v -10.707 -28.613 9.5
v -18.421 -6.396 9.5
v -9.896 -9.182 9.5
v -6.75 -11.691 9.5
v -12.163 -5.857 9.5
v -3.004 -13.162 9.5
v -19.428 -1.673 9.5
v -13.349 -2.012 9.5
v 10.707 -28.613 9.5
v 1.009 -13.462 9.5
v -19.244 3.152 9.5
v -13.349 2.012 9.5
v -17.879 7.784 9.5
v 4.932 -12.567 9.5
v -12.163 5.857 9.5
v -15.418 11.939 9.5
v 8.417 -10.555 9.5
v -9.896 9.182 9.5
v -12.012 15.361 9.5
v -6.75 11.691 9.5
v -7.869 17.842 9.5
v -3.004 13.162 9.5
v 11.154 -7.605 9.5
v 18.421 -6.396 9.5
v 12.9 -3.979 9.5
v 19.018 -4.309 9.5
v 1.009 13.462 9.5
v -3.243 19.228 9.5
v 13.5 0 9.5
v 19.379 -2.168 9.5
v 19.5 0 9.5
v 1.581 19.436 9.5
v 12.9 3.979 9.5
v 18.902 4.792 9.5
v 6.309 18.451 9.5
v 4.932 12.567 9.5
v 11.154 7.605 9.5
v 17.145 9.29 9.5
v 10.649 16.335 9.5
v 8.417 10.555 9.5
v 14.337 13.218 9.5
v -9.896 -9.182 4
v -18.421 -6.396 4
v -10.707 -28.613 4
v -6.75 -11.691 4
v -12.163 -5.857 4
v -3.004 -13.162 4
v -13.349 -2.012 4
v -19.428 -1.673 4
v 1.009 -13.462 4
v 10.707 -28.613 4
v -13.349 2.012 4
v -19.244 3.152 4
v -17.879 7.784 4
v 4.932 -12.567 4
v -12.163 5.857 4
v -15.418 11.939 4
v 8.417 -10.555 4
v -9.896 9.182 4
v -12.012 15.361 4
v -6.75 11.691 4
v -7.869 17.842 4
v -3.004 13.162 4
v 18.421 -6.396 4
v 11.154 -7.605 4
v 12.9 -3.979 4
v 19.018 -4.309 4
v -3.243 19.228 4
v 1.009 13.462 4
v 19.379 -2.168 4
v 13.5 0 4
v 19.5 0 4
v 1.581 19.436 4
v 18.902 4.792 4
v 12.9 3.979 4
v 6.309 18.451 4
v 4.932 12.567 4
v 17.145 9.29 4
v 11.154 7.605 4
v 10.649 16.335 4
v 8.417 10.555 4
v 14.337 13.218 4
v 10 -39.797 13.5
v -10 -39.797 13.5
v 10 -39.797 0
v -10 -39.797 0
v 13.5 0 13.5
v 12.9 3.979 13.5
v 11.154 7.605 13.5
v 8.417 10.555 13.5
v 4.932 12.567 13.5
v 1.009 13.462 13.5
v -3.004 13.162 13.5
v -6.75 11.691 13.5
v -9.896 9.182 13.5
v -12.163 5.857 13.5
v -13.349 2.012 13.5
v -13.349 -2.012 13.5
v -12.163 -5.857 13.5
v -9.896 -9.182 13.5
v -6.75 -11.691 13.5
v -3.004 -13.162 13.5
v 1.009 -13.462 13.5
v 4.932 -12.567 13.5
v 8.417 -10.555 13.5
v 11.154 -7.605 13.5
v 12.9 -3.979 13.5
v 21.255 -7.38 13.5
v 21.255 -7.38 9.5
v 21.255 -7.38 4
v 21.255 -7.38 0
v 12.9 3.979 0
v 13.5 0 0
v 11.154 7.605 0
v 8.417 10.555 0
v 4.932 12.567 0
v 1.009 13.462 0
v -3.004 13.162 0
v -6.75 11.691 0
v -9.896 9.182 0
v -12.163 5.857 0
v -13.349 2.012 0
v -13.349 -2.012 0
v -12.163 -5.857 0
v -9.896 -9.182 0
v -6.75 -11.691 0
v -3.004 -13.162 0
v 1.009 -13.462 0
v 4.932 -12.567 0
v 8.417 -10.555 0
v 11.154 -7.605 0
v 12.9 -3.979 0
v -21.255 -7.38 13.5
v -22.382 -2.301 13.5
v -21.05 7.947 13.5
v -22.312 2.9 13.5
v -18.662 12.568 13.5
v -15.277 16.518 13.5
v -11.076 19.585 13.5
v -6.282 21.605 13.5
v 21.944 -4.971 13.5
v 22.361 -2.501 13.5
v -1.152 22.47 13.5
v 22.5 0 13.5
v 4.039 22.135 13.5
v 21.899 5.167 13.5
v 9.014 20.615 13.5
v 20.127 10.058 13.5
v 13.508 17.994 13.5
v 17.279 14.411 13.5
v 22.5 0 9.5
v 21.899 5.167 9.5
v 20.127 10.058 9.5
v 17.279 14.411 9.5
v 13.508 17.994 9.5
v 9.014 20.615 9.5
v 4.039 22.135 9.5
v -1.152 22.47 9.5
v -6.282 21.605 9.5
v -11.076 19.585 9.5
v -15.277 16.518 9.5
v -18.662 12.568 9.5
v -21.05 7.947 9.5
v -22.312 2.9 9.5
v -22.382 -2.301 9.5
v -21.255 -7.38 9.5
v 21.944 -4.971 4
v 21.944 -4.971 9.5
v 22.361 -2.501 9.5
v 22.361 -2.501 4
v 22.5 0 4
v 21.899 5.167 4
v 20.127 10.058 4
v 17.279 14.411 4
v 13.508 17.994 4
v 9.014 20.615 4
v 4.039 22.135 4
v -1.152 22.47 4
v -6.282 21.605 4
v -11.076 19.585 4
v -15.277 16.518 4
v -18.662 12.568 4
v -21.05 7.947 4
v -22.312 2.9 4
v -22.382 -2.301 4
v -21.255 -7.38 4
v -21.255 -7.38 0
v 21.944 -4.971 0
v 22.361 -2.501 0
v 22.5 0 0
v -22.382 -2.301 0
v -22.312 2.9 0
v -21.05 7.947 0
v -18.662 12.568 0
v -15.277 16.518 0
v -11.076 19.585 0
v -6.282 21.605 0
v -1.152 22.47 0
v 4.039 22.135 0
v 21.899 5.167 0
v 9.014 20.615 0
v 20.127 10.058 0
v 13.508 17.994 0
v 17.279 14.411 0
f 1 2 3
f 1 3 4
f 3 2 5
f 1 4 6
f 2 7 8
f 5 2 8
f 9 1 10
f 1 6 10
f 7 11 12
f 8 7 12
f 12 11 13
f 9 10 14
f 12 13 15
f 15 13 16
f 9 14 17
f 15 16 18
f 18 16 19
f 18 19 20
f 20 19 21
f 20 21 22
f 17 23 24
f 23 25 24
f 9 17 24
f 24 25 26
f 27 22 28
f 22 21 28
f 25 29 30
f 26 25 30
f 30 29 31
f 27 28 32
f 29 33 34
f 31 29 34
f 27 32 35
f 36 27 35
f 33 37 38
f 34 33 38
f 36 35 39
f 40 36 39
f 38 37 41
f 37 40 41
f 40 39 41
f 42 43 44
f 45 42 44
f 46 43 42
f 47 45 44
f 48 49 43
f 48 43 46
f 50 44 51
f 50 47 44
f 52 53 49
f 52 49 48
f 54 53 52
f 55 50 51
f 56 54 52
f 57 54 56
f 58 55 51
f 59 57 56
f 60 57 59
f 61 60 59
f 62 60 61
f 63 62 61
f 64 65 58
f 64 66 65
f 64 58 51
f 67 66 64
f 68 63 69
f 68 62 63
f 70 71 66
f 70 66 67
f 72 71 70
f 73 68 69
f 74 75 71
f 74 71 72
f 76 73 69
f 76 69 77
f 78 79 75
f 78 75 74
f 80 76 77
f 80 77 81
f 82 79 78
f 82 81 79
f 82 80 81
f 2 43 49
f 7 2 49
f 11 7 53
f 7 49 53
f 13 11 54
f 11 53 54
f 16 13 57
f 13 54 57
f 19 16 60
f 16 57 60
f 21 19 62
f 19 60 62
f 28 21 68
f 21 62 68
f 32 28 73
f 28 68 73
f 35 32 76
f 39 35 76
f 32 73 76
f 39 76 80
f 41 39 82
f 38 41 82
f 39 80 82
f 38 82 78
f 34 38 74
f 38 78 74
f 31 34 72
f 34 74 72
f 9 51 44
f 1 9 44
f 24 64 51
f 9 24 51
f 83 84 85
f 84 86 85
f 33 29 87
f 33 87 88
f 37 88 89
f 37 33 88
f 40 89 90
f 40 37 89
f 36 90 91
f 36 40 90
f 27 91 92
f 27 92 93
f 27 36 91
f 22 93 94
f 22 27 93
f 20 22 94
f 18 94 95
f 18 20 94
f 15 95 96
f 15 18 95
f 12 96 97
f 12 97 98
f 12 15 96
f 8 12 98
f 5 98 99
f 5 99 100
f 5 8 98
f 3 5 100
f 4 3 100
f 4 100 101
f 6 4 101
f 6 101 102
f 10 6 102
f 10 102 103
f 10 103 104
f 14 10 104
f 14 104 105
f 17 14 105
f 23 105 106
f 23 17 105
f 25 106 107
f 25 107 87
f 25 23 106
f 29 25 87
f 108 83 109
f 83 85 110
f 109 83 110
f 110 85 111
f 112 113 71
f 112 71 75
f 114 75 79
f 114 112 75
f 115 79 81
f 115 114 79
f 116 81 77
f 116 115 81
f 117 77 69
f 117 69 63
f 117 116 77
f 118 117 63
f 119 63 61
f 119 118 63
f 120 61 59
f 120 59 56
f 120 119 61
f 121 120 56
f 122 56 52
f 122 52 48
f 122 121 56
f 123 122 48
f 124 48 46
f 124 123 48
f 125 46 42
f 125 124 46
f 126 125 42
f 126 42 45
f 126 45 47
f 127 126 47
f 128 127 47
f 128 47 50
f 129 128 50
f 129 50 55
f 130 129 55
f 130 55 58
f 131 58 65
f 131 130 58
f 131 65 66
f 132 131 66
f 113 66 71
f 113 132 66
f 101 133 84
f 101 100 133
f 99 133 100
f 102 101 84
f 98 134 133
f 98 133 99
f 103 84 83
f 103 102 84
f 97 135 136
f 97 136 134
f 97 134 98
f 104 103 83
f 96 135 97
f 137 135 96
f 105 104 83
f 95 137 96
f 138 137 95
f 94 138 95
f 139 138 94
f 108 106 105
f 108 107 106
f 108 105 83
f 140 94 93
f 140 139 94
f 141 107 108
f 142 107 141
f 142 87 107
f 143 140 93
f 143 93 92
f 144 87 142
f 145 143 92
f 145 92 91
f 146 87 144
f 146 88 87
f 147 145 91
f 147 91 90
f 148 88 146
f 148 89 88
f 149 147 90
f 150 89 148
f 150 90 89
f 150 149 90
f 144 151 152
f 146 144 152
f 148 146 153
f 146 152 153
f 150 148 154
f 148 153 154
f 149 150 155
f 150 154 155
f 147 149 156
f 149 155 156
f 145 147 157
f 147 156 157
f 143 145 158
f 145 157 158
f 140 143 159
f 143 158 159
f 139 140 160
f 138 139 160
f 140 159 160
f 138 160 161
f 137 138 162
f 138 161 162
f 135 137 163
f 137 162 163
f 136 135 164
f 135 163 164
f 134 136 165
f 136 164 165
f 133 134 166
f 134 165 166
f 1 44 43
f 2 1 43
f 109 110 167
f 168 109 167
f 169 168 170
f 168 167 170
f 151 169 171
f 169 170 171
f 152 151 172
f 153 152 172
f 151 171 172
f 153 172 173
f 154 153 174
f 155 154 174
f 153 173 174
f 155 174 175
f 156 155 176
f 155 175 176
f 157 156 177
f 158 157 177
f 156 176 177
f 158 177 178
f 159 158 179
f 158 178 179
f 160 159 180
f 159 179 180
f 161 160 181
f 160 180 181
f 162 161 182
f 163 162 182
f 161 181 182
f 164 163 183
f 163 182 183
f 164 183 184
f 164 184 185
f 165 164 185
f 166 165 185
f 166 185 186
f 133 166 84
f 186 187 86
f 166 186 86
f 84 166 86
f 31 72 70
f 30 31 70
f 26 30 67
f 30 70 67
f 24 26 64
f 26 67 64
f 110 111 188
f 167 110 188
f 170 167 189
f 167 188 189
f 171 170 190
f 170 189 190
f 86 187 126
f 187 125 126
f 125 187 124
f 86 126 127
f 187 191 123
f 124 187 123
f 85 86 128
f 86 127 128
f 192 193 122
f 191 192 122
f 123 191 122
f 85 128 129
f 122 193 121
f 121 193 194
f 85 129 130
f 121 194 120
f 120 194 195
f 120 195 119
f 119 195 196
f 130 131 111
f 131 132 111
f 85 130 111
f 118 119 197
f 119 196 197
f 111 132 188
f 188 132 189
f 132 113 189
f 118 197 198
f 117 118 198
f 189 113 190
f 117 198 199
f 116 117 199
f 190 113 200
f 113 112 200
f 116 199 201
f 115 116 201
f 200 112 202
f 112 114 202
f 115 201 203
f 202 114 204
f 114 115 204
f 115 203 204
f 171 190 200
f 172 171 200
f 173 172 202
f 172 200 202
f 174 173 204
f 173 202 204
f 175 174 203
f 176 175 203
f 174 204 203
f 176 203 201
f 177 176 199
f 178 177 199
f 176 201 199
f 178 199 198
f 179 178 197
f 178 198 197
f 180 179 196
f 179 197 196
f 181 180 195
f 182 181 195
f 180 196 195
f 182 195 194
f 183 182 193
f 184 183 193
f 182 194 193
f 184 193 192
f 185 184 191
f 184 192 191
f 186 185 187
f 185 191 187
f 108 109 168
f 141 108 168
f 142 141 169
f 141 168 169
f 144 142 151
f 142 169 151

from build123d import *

# Parameters (mm, degrees)
F0_R     = 13.5
F1_DEPTH = 4
F3_DEPTH = 5.5
F4_R     = 13.5
F5_DEPTH = 4


with BuildPart() as f1:
    # F0 (on Top) → F1 (new body)
    with BuildSketch(Plane.XY):
        with BuildLine():
            ThreePointArc((21.255276, -7.379922), (22.186637, -3.742078), (22.5, 0))
            ThreePointArc((22.5, 0), (-3.742078, 22.186637), (-21.255276, -7.379922))
            ThreePointArc((-21.255276, -7.379922), (0, -22.5), (21.255276, -7.379922))
        make_face()
        Circle(F0_R, mode=Mode.SUBTRACT)
        with BuildLine():
            ThreePointArc((21.255276, -7.379922), (0, -22.5), (-21.255276, -7.379922))
            Line((-21.255276, -7.379922), (-10, -39.796796))
            Line((-10, -39.796796), (0, -39.796796))
            Line((0, -39.796796), (10, -39.796796))
            Line((10, -39.796796), (21.255276, -7.379922))
        make_face()
    extrude(amount=F1_DEPTH)

    # F2 (on face) → F3 (join)
    with BuildSketch(Plane.XY.offset(4)):
        with BuildLine():
            Line((10, -39.796796), (21.255276, -7.379922))
            ThreePointArc((21.255276, -7.379922), (0, 22.5), (-21.255276, -7.379922))
            Line((-21.255276, -7.379922), (-10, -39.796796))
            Line((-10, -39.796796), (10, -39.796796))
        make_face()
        with BuildLine():
            ThreePointArc((-18.421239, -6.395932), (-3.243134, 19.228419), (19.5, 0))
            ThreePointArc((19.5, 0), (19.228419, -3.243134), (18.421239, -6.395932))
            Line((18.421239, -6.395932), (10.707315, -28.613186))
            Line((10.707315, -28.613186), (-10.707315, -28.613186))
            Line((-10.707315, -28.613186), (-18.421239, -6.395932))
        make_face(mode=Mode.SUBTRACT)
    extrude(amount=F3_DEPTH)

    # F4 (on face) + F0 (on Top) → F5 (join)
    with BuildSketch(Plane.XY.offset(9.5)):
        with BuildLine():
            ThreePointArc((21.255276, -7.379922), (22.186637, -3.742078), (22.5, 0))
            ThreePointArc((22.5, 0), (-3.742078, 22.186637), (-21.255276, -7.379922))
            ThreePointArc((-21.255276, -7.379922), (0, -22.5), (21.255276, -7.379922))
        make_face()
        Circle(F4_R, mode=Mode.SUBTRACT)
        with BuildLine():
            ThreePointArc((21.255276, -7.379922), (0, -22.5), (-21.255276, -7.379922))
            Line((-21.255276, -7.379922), (-10, -39.796796))
            Line((-10, -39.796796), (0, -39.796796))
            Line((0, -39.796796), (10, -39.796796))
            Line((10, -39.796796), (21.255276, -7.379922))
        make_face()
    with BuildSketch(Plane.XY):
        with BuildLine():
            ThreePointArc((21.255276, -7.379922), (22.186637, -3.742078), (22.5, 0))
            ThreePointArc((22.5, 0), (-3.742078, 22.186637), (-21.255276, -7.379922))
            ThreePointArc((-21.255276, -7.379922), (0, -22.5), (21.255276, -7.379922))
        make_face()
        Circle(F0_R, mode=Mode.SUBTRACT)
        with BuildLine():
            ThreePointArc((21.255276, -7.379922), (0, -22.5), (-21.255276, -7.379922))
            Line((-21.255276, -7.379922), (-10, -39.796796))
            Line((-10, -39.796796), (0, -39.796796))
            Line((0, -39.796796), (10, -39.796796))
            Line((10, -39.796796), (21.255276, -7.379922))
        make_face()
    extrude(amount=F5_DEPTH)


solid = f1.part
